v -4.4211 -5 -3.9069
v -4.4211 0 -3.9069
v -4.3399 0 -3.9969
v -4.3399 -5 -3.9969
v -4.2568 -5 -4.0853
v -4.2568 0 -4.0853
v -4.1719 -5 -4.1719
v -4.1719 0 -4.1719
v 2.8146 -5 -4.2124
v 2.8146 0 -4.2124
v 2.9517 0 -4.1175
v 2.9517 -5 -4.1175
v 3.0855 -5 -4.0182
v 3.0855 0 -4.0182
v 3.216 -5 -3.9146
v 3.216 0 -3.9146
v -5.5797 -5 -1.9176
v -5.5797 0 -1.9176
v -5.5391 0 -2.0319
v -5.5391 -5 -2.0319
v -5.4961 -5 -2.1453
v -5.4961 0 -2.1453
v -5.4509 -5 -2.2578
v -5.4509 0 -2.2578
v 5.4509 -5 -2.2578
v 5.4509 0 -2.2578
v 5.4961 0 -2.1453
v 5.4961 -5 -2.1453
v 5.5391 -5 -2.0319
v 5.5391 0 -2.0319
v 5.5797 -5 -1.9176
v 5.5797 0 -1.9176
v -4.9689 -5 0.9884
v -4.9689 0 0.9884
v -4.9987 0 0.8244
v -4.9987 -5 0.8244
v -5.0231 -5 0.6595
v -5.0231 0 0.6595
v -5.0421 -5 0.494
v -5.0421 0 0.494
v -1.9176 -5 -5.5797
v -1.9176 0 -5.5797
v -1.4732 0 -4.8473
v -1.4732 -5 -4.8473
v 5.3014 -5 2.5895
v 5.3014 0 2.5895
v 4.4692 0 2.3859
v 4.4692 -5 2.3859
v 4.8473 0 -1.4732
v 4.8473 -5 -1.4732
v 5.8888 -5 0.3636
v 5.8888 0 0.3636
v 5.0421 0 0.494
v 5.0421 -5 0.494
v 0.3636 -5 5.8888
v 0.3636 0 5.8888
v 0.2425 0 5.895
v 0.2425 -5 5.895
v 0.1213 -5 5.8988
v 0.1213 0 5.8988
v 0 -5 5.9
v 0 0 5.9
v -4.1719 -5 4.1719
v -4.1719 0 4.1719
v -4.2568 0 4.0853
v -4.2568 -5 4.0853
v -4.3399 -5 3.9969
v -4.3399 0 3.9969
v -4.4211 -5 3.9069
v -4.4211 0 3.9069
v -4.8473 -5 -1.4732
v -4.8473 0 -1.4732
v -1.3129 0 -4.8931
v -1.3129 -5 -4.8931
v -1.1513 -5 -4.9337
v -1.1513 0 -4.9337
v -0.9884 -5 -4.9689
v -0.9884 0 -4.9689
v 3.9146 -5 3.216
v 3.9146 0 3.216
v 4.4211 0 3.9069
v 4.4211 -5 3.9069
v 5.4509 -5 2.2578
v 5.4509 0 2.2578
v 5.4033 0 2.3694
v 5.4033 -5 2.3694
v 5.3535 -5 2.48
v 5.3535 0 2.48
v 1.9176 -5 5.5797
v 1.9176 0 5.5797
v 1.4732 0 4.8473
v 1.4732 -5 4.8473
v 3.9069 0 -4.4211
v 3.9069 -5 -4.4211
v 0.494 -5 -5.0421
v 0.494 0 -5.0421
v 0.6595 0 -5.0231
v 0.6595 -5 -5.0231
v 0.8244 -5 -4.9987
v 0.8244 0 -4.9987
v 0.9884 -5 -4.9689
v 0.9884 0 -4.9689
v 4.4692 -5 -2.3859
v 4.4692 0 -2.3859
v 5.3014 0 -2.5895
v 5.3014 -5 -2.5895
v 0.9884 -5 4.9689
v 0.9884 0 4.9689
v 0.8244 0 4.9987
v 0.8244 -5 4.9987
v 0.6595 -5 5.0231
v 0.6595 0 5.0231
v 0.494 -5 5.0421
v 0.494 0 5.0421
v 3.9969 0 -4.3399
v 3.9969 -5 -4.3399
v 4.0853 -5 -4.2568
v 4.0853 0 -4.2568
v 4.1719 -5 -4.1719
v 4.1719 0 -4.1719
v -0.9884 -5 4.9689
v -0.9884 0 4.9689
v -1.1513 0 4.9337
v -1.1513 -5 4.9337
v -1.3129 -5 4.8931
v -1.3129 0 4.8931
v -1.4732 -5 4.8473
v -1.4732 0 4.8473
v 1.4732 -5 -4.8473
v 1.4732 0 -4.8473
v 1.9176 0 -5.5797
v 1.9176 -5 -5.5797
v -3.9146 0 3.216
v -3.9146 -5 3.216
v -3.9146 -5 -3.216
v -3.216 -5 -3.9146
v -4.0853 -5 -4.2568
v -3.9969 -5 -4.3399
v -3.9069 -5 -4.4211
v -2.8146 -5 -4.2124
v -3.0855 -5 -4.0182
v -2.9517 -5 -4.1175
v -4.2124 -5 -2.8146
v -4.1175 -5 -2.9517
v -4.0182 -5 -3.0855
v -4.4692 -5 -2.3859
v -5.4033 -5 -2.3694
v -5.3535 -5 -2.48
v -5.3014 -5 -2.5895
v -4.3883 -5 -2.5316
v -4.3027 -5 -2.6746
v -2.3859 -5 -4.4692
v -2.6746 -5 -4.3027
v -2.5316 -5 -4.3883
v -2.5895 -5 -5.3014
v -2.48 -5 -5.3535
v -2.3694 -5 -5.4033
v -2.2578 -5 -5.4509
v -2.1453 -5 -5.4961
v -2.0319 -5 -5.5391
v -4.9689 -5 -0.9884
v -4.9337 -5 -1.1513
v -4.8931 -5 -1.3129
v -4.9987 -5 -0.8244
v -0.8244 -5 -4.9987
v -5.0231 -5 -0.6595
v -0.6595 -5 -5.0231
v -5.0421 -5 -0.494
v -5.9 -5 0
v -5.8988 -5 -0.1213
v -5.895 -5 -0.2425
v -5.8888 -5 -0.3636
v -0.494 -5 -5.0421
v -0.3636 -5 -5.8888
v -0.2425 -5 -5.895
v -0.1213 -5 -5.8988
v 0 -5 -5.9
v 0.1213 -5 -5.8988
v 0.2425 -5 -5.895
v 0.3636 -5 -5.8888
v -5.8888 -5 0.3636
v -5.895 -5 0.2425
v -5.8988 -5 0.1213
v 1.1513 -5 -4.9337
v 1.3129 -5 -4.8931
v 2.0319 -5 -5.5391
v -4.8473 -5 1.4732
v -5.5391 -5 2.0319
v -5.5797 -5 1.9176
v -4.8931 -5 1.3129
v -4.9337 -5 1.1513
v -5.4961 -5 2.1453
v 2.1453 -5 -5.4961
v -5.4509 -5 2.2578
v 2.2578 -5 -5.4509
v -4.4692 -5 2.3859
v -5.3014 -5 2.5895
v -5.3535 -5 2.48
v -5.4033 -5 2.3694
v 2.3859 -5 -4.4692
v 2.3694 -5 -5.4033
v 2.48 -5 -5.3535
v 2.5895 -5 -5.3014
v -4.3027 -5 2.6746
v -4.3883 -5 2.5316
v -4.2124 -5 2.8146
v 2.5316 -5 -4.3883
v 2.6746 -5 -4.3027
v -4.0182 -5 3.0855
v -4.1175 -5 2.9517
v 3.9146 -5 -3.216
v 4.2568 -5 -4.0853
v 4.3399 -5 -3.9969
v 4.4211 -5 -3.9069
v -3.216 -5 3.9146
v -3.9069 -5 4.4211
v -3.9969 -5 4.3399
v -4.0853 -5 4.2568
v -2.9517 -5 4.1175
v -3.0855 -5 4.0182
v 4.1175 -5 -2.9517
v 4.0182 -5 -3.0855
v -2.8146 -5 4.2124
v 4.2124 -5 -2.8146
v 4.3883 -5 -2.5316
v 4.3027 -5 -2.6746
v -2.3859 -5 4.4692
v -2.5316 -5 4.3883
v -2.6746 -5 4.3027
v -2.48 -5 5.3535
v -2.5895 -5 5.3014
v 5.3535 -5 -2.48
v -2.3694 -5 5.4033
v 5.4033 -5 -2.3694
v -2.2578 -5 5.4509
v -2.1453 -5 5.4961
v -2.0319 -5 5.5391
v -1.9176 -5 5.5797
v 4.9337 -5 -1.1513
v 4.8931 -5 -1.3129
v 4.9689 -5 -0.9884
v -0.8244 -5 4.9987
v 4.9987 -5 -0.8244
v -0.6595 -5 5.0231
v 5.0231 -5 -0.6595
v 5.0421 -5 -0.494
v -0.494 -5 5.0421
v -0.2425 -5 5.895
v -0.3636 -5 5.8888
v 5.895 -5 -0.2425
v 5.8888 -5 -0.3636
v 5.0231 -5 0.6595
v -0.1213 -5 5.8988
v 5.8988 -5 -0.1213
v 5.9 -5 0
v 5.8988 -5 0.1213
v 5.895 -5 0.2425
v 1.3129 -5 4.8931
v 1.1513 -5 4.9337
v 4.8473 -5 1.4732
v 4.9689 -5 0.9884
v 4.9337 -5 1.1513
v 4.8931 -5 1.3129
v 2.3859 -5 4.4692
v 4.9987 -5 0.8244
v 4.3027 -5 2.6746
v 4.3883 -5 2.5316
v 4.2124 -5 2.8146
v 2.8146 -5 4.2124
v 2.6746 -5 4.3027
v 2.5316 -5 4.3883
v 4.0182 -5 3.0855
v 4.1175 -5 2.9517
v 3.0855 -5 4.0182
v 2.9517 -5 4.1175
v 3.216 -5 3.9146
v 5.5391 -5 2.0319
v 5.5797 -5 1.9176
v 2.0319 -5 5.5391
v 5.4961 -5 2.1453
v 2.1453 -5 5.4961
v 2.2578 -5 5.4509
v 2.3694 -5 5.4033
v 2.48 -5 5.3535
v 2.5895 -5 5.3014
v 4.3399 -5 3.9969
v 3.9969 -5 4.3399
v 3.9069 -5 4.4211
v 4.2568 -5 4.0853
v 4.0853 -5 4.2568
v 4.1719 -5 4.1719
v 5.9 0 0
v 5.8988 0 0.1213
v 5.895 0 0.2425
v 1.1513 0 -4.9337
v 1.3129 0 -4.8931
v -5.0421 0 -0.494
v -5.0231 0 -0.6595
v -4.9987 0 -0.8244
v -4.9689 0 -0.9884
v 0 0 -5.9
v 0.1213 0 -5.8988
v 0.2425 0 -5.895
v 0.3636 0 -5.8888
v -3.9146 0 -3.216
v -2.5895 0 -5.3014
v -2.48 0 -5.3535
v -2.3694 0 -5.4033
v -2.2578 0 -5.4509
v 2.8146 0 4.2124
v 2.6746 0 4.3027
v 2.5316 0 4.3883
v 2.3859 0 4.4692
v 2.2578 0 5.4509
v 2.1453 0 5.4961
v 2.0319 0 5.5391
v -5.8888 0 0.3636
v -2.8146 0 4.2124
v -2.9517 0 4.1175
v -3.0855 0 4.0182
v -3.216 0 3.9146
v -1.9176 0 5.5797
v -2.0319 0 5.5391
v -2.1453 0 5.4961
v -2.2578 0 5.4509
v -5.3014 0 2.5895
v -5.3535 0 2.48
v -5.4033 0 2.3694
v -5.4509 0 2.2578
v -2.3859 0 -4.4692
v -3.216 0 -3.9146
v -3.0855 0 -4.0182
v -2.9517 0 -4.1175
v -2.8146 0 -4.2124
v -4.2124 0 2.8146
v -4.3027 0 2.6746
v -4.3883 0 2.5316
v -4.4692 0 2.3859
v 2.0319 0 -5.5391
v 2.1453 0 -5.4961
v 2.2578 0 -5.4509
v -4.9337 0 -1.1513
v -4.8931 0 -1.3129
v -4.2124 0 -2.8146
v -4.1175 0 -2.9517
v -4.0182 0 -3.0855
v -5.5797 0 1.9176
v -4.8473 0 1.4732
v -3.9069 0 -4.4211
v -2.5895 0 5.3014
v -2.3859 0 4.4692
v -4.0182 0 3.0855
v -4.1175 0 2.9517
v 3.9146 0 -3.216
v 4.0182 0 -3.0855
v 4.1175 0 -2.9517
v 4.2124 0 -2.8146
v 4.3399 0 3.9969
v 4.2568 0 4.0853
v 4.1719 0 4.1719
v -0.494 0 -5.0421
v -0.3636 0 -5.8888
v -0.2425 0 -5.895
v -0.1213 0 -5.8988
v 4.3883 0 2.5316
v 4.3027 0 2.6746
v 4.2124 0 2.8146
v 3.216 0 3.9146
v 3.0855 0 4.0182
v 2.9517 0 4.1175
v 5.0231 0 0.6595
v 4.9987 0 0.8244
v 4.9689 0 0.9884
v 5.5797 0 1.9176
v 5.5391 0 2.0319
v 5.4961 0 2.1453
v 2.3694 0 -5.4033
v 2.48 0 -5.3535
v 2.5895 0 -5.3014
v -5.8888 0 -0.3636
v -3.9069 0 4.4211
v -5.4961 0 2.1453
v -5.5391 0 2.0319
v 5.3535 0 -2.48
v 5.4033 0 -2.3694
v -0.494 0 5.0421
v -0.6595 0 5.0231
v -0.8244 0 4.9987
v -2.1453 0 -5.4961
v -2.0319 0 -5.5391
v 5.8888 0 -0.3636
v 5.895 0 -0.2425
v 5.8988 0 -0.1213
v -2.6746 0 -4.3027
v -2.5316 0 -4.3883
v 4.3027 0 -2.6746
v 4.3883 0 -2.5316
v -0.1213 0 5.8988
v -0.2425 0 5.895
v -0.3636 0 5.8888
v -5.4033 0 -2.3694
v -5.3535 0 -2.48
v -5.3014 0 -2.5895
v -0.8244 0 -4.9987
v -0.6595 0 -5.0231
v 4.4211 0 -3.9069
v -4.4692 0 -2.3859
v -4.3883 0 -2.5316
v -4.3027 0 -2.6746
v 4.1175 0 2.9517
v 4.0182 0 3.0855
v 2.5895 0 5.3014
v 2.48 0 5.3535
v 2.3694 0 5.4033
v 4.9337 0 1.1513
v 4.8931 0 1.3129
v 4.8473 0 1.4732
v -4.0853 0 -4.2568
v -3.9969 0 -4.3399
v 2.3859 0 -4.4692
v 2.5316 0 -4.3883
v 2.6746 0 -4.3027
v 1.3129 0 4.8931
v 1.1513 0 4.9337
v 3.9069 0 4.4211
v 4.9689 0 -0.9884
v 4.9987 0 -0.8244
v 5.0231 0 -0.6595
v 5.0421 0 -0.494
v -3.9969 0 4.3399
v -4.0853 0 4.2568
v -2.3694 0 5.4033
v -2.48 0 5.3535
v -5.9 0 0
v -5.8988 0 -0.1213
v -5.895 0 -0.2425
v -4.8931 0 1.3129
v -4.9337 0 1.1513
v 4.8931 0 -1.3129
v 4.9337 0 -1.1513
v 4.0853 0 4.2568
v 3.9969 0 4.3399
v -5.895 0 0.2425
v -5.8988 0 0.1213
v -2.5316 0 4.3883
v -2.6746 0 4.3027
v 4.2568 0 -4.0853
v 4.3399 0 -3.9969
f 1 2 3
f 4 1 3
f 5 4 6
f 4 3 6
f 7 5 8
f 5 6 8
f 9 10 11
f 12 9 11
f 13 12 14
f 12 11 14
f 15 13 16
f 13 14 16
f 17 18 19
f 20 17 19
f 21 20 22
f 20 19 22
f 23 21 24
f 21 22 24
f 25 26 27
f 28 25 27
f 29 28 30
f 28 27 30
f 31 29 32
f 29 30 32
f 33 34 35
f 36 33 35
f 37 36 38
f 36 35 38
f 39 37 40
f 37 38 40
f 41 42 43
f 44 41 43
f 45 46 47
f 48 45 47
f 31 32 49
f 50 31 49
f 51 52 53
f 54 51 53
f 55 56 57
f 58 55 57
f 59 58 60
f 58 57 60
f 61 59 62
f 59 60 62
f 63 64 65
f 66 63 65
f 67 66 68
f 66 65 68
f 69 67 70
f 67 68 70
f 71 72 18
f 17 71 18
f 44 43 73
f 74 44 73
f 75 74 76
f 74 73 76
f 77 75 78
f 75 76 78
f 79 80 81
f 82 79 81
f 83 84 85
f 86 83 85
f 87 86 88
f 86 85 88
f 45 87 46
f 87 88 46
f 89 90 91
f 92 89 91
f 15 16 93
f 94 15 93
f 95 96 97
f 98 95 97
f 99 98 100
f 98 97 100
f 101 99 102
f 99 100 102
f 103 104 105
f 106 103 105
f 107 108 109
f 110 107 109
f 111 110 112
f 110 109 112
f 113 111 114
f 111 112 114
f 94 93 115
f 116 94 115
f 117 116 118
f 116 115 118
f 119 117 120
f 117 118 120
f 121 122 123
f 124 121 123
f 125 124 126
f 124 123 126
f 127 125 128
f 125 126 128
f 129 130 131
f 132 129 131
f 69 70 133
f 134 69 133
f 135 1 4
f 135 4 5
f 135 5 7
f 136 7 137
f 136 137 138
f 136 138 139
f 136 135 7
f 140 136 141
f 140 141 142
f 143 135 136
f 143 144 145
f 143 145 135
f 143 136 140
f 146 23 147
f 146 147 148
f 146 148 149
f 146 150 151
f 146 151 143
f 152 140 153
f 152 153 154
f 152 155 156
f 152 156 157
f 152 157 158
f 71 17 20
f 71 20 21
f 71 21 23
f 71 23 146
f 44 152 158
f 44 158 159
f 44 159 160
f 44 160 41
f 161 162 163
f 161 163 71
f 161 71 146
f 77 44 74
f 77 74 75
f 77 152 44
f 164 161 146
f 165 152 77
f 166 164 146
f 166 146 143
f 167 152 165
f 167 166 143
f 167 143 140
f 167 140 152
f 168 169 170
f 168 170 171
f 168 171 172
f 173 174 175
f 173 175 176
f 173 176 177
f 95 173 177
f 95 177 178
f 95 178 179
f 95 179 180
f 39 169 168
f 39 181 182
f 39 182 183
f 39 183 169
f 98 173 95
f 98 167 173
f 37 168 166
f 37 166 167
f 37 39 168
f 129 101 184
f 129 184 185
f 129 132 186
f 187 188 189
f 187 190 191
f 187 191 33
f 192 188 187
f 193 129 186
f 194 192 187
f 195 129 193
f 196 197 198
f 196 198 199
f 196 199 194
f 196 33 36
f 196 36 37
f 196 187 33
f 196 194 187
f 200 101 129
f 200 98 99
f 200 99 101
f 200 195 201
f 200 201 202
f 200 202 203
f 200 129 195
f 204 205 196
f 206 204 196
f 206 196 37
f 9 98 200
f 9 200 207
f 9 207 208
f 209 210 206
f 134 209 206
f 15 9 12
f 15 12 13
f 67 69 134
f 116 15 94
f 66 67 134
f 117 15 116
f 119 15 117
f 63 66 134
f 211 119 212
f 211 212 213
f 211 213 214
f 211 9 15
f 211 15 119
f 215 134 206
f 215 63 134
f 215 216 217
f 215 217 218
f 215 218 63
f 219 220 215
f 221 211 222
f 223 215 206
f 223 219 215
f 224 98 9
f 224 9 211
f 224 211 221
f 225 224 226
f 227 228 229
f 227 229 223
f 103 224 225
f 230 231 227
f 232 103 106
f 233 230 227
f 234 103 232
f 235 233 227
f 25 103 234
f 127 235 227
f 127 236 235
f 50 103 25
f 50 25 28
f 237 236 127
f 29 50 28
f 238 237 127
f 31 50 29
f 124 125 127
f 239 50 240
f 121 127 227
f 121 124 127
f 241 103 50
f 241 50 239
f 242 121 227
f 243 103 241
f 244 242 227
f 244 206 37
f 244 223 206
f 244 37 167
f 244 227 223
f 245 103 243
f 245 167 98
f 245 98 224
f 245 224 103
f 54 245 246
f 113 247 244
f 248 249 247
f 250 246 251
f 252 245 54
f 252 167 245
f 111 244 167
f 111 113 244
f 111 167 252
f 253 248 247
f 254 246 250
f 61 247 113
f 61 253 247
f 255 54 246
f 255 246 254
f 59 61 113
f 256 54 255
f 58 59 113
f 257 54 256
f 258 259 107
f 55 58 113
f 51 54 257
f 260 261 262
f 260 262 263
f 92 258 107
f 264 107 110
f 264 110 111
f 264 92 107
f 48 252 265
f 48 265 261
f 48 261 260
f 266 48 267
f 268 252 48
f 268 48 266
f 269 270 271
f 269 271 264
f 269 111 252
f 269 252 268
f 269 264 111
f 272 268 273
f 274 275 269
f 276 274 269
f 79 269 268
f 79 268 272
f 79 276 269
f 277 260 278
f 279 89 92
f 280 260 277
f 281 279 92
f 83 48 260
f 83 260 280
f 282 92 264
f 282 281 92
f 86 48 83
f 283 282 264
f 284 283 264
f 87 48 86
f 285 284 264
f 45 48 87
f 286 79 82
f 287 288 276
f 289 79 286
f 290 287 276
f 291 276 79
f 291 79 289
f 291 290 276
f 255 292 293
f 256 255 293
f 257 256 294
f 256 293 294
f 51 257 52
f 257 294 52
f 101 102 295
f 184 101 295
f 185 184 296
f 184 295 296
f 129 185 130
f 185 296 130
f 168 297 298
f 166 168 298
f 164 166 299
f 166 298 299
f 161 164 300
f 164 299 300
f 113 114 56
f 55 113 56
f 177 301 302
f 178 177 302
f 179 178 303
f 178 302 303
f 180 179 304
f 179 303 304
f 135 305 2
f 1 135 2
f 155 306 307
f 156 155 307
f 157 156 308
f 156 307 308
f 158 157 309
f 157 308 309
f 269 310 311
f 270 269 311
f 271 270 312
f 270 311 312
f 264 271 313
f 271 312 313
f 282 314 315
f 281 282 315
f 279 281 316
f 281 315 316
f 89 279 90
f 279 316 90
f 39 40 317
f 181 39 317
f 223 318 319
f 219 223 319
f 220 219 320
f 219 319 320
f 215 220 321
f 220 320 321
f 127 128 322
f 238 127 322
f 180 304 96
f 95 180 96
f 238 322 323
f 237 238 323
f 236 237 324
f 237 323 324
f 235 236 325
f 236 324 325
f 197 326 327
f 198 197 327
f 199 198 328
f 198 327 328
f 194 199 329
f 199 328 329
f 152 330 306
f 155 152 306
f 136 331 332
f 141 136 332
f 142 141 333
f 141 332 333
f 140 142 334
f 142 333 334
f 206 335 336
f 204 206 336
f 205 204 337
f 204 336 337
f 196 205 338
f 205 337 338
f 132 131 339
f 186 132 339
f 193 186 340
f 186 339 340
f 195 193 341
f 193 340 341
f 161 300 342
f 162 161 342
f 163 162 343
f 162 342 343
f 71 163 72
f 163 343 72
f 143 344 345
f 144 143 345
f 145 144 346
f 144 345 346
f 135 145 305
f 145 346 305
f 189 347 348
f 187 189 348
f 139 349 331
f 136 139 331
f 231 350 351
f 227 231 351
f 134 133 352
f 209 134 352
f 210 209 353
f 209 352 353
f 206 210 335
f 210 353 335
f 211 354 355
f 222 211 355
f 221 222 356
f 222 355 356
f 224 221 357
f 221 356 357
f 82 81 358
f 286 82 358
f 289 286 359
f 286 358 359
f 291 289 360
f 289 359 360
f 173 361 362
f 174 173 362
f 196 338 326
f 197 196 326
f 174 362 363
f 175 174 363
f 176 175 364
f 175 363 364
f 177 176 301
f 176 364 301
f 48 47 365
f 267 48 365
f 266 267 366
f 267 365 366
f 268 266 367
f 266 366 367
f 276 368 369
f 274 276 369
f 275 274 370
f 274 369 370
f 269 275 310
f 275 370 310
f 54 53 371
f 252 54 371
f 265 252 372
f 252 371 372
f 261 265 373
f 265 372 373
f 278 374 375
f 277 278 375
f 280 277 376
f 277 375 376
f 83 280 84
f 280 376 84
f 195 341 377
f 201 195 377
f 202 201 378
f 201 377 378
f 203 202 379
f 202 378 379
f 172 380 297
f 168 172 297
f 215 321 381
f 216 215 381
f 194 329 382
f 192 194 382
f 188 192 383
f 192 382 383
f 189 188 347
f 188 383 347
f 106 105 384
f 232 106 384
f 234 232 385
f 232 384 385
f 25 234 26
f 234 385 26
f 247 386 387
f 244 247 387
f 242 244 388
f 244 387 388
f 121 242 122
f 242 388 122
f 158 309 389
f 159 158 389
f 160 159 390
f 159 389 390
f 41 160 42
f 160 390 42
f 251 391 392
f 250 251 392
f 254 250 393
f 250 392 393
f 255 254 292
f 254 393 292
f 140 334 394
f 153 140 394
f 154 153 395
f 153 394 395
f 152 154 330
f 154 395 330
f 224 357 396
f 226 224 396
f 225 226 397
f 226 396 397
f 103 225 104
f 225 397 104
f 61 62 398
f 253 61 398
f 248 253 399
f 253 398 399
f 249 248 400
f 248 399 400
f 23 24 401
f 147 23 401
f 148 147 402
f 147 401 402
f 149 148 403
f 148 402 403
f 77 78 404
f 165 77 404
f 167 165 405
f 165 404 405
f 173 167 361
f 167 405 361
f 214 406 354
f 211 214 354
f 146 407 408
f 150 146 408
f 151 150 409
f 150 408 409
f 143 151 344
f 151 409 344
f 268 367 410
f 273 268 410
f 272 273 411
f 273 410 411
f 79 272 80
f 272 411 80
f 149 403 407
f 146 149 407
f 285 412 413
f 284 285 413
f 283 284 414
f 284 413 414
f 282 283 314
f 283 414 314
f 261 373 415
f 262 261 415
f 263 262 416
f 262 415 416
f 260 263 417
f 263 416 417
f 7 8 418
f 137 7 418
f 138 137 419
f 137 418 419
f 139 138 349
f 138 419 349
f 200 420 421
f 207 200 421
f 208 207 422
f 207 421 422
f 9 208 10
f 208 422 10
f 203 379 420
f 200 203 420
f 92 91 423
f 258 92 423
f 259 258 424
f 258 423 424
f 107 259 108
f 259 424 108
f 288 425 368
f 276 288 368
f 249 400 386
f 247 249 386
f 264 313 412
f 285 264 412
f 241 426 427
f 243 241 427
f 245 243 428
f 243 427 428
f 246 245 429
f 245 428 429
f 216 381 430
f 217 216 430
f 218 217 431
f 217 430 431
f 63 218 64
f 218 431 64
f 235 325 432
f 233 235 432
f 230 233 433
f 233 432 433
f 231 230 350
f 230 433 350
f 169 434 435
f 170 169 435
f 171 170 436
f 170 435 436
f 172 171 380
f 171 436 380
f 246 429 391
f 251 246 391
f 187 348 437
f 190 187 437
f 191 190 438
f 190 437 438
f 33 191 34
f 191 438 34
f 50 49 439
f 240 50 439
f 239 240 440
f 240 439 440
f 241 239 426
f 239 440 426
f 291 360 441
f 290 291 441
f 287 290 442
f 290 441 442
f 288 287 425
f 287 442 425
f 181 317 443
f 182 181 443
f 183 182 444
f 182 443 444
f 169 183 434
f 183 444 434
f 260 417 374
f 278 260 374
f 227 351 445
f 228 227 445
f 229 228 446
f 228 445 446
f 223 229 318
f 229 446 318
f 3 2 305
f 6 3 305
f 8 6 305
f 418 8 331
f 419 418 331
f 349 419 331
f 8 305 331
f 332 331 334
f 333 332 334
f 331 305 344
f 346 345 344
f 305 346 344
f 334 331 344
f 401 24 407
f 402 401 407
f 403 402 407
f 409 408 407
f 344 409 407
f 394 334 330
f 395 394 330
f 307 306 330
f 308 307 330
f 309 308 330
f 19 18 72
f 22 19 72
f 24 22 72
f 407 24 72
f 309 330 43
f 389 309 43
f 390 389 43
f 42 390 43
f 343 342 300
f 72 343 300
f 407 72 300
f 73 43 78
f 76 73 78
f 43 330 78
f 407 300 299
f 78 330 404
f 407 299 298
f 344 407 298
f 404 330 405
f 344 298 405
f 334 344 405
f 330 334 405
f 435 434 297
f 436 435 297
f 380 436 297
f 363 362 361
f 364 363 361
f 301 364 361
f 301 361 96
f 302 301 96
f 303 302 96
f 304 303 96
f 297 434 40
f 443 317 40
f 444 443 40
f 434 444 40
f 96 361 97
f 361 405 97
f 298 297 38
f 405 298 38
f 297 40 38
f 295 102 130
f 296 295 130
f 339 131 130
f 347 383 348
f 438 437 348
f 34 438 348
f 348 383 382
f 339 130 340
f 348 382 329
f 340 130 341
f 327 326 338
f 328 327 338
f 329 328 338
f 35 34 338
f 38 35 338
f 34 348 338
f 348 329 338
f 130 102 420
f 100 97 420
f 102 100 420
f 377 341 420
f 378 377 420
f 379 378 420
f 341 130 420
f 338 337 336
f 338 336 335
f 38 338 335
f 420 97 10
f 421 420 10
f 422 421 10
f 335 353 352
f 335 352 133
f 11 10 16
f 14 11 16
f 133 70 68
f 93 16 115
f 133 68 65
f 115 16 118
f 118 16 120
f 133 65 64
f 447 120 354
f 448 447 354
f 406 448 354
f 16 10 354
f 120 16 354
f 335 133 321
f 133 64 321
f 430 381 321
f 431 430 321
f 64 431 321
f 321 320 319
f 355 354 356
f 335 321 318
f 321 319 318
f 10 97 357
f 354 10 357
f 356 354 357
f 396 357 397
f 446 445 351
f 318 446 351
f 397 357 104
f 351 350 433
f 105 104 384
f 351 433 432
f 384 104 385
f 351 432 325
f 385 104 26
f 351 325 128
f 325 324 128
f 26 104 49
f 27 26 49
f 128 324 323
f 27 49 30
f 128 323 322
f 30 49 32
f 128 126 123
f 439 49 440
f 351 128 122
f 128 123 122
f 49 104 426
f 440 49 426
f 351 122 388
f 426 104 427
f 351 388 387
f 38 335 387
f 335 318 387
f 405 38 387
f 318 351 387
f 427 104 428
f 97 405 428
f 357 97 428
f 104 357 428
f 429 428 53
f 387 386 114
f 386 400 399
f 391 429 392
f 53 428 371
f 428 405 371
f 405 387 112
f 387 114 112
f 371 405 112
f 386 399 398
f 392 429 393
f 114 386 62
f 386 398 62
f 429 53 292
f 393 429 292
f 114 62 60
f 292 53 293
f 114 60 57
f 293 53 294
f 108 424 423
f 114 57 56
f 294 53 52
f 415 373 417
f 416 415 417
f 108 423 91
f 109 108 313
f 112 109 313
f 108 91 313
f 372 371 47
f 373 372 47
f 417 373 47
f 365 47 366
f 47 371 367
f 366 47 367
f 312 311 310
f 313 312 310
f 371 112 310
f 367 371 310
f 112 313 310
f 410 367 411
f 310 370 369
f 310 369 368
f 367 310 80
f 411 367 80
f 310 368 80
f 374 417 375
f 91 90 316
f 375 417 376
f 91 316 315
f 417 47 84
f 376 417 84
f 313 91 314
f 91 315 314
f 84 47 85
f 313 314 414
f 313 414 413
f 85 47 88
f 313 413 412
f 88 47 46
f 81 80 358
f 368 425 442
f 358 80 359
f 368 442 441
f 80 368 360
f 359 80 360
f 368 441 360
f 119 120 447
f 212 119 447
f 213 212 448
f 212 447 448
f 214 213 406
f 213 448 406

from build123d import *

# Parameters (mm, degrees)
F1_DEPTH = 5


with BuildPart() as f1:
    # F0 (on Front) → F1 (new body)
    with BuildSketch(Plane.XZ):
        with BuildLine():
            ThreePointArc((4.847286, -1.473153), (4.914051, -1.23226), (4.968852, -0.988366))
            ThreePointArc((4.968852, -0.988366), (5.011556, -0.742066), (5.042059, -0.49396))
            Line((5.042059, -0.49396), (5.888783, -0.363636))
            ThreePointArc((5.888783, -0.363636), (5.897195, -0.181905), (5.9, 0))
            ThreePointArc((5.9, 0), (5.897195, 0.181905), (5.888783, 0.363636))
            Line((5.888783, 0.363636), (5.042059, 0.49396))
            ThreePointArc((5.042059, 0.49396), (5.011556, 0.742066), (4.968852, 0.988366))
            ThreePointArc((4.968852, 0.988366), (4.914051, 1.23226), (4.847286, 1.473153))
            Line((4.847286, 1.473153), (5.579684, 1.917584))
            ThreePointArc((5.579684, 1.917584), (5.51791, 2.088701), (5.450889, 2.257832))
            ThreePointArc((5.450889, 2.257832), (5.378686, 2.424817), (5.301369, 2.589496))
            Line((5.301369, 2.589496), (4.469225, 2.385872))
            ThreePointArc((4.469225, 2.385872), (4.346098, 2.603419), (4.212389, 2.814629))
            ThreePointArc((4.212389, 2.814629), (4.068426, 3.018985), (3.914557, 3.215992))
            Line((3.914557, 3.215992), (4.421128, 3.906869))
            ThreePointArc((4.421128, 3.906869), (4.298573, 4.041321), (4.17193, 4.17193))
            ThreePointArc((4.17193, 4.17193), (4.041321, 4.298573), (3.906869, 4.421128))
            Line((3.906869, 4.421128), (3.215992, 3.914557))
            ThreePointArc((3.215992, 3.914557), (3.018985, 4.068426), (2.814629, 4.212389))
            ThreePointArc((2.814629, 4.212389), (2.603419, 4.346098), (2.385872, 4.469225))
            Line((2.385872, 4.469225), (2.589496, 5.301369))
            ThreePointArc((2.589496, 5.301369), (2.424817, 5.378686), (2.257832, 5.450889))
            ThreePointArc((2.257832, 5.450889), (2.088701, 5.51791), (1.917584, 5.579684))
            Line((1.917584, 5.579684), (1.473153, 4.847286))
            ThreePointArc((1.473153, 4.847286), (1.23226, 4.914051), (0.988366, 4.968852))
            ThreePointArc((0.988366, 4.968852), (0.742066, 5.011556), (0.49396, 5.042059))
            Line((0.49396, 5.042059), (0.363636, 5.888783))
            ThreePointArc((0.363636, 5.888783), (0.181905, 5.897195), (0, 5.9))
            ThreePointArc((0, 5.9), (-0.181905, 5.897195), (-0.363636, 5.888783))
            Line((-0.363636, 5.888783), (-0.49396, 5.042059))
            ThreePointArc((-0.49396, 5.042059), (-0.742066, 5.011556), (-0.988366, 4.968852))
            ThreePointArc((-0.988366, 4.968852), (-1.23226, 4.914051), (-1.473153, 4.847286))
            Line((-1.473153, 4.847286), (-1.917584, 5.579684))
            ThreePointArc((-1.917584, 5.579684), (-2.088701, 5.51791), (-2.257832, 5.450889))
            ThreePointArc((-2.257832, 5.450889), (-2.424817, 5.378686), (-2.589496, 5.301369))
            Line((-2.589496, 5.301369), (-2.385872, 4.469225))
            ThreePointArc((-2.385872, 4.469225), (-2.603419, 4.346098), (-2.814629, 4.212389))
            ThreePointArc((-2.814629, 4.212389), (-3.018985, 4.068426), (-3.215992, 3.914557))
            Line((-3.215992, 3.914557), (-3.906869, 4.421128))
            ThreePointArc((-3.906869, 4.421128), (-4.041321, 4.298573), (-4.17193, 4.17193))
            ThreePointArc((-4.17193, 4.17193), (-4.298573, 4.041321), (-4.421128, 3.906869))
            Line((-4.421128, 3.906869), (-3.914557, 3.215992))
            ThreePointArc((-3.914557, 3.215992), (-4.068426, 3.018985), (-4.212389, 2.814629))
            ThreePointArc((-4.212389, 2.814629), (-4.346098, 2.603419), (-4.469225, 2.385872))
            Line((-4.469225, 2.385872), (-5.301369, 2.589496))
            ThreePointArc((-5.301369, 2.589496), (-5.378686, 2.424817), (-5.450889, 2.257832))
            ThreePointArc((-5.450889, 2.257832), (-5.51791, 2.088701), (-5.579684, 1.917584))
            Line((-5.579684, 1.917584), (-4.847286, 1.473153))
            ThreePointArc((-4.847286, 1.473153), (-4.914051, 1.23226), (-4.968852, 0.988366))
            ThreePointArc((-4.968852, 0.988366), (-5.011556, 0.742066), (-5.042059, 0.49396))
            Line((-5.042059, 0.49396), (-5.888783, 0.363636))
            ThreePointArc((-5.888783, 0.363636), (-5.897195, 0.181905), (-5.9, 0))
            ThreePointArc((-5.9, 0), (-5.897195, -0.181905), (-5.888783, -0.363636))
            Line((-5.888783, -0.363636), (-5.042059, -0.49396))
            ThreePointArc((-5.042059, -0.49396), (-5.011556, -0.742066), (-4.968852, -0.988366))
            ThreePointArc((-4.968852, -0.988366), (-4.914051, -1.23226), (-4.847286, -1.473153))
            Line((-4.847286, -1.473153), (-5.579684, -1.917584))
            ThreePointArc((-5.579684, -1.917584), (-5.51791, -2.088701), (-5.450889, -2.257832))
            ThreePointArc((-5.450889, -2.257832), (-5.378686, -2.424817), (-5.301369, -2.589496))
            Line((-5.301369, -2.589496), (-4.469225, -2.385872))
            ThreePointArc((-4.469225, -2.385872), (-4.346098, -2.603419), (-4.212389, -2.814629))
            ThreePointArc((-4.212389, -2.814629), (-4.068426, -3.018985), (-3.914557, -3.215992))
            Line((-3.914557, -3.215992), (-4.421128, -3.906869))
            ThreePointArc((-4.421128, -3.906869), (-4.298573, -4.041321), (-4.17193, -4.17193))
            ThreePointArc((-4.17193, -4.17193), (-4.041321, -4.298573), (-3.906869, -4.421128))
            Line((-3.906869, -4.421128), (-3.215992, -3.914557))
            ThreePointArc((-3.215992, -3.914557), (-3.018985, -4.068426), (-2.814629, -4.212389))
            ThreePointArc((-2.814629, -4.212389), (-2.603419, -4.346098), (-2.385872, -4.469225))
            Line((-2.385872, -4.469225), (-2.589496, -5.301369))
            ThreePointArc((-2.589496, -5.301369), (-2.424817, -5.378686), (-2.257832, -5.450889))
            ThreePointArc((-2.257832, -5.450889), (-2.088701, -5.51791), (-1.917584, -5.579684))
            Line((-1.917584, -5.579684), (-1.473153, -4.847286))
            ThreePointArc((-1.473153, -4.847286), (-1.23226, -4.914051), (-0.988366, -4.968852))
            ThreePointArc((-0.988366, -4.968852), (-0.742066, -5.011556), (-0.49396, -5.042059))
            Line((-0.49396, -5.042059), (-0.363636, -5.888783))
            ThreePointArc((-0.363636, -5.888783), (-0.181905, -5.897195), (0, -5.9))
            ThreePointArc((0, -5.9), (0.181905, -5.897195), (0.363636, -5.888783))
            Line((0.363636, -5.888783), (0.49396, -5.042059))
            ThreePointArc((0.49396, -5.042059), (0.742066, -5.011556), (0.988366, -4.968852))
            ThreePointArc((0.988366, -4.968852), (1.23226, -4.914051), (1.473153, -4.847286))
            Line((1.473153, -4.847286), (1.917584, -5.579684))
            ThreePointArc((1.917584, -5.579684), (2.088701, -5.51791), (2.257832, -5.450889))
            ThreePointArc((2.257832, -5.450889), (2.424817, -5.378686), (2.589496, -5.301369))
            Line((2.589496, -5.301369), (2.385872, -4.469225))
            ThreePointArc((2.385872, -4.469225), (2.603419, -4.346098), (2.814629, -4.212389))
            ThreePointArc((2.814629, -4.212389), (3.018985, -4.068426), (3.215992, -3.914557))
            Line((3.215992, -3.914557), (3.906869, -4.421128))
            ThreePointArc((3.906869, -4.421128), (4.041321, -4.298573), (4.17193, -4.17193))
            ThreePointArc((4.17193, -4.17193), (4.298573, -4.041321), (4.421128, -3.906869))
            Line((4.421128, -3.906869), (3.914557, -3.215992))
            ThreePointArc((3.914557, -3.215992), (4.068426, -3.018985), (4.212389, -2.814629))
            ThreePointArc((4.212389, -2.814629), (4.346098, -2.603419), (4.469225, -2.385872))
            Line((4.469225, -2.385872), (5.301369, -2.589496))
            ThreePointArc((5.301369, -2.589496), (5.378686, -2.424817), (5.450889, -2.257832))
            ThreePointArc((5.450889, -2.257832), (5.51791, -2.088701), (5.579684, -1.917584))
            Line((5.579684, -1.917584), (4.847286, -1.473153))
        make_face()
    extrude(amount=F1_DEPTH)


solid = f1.part
